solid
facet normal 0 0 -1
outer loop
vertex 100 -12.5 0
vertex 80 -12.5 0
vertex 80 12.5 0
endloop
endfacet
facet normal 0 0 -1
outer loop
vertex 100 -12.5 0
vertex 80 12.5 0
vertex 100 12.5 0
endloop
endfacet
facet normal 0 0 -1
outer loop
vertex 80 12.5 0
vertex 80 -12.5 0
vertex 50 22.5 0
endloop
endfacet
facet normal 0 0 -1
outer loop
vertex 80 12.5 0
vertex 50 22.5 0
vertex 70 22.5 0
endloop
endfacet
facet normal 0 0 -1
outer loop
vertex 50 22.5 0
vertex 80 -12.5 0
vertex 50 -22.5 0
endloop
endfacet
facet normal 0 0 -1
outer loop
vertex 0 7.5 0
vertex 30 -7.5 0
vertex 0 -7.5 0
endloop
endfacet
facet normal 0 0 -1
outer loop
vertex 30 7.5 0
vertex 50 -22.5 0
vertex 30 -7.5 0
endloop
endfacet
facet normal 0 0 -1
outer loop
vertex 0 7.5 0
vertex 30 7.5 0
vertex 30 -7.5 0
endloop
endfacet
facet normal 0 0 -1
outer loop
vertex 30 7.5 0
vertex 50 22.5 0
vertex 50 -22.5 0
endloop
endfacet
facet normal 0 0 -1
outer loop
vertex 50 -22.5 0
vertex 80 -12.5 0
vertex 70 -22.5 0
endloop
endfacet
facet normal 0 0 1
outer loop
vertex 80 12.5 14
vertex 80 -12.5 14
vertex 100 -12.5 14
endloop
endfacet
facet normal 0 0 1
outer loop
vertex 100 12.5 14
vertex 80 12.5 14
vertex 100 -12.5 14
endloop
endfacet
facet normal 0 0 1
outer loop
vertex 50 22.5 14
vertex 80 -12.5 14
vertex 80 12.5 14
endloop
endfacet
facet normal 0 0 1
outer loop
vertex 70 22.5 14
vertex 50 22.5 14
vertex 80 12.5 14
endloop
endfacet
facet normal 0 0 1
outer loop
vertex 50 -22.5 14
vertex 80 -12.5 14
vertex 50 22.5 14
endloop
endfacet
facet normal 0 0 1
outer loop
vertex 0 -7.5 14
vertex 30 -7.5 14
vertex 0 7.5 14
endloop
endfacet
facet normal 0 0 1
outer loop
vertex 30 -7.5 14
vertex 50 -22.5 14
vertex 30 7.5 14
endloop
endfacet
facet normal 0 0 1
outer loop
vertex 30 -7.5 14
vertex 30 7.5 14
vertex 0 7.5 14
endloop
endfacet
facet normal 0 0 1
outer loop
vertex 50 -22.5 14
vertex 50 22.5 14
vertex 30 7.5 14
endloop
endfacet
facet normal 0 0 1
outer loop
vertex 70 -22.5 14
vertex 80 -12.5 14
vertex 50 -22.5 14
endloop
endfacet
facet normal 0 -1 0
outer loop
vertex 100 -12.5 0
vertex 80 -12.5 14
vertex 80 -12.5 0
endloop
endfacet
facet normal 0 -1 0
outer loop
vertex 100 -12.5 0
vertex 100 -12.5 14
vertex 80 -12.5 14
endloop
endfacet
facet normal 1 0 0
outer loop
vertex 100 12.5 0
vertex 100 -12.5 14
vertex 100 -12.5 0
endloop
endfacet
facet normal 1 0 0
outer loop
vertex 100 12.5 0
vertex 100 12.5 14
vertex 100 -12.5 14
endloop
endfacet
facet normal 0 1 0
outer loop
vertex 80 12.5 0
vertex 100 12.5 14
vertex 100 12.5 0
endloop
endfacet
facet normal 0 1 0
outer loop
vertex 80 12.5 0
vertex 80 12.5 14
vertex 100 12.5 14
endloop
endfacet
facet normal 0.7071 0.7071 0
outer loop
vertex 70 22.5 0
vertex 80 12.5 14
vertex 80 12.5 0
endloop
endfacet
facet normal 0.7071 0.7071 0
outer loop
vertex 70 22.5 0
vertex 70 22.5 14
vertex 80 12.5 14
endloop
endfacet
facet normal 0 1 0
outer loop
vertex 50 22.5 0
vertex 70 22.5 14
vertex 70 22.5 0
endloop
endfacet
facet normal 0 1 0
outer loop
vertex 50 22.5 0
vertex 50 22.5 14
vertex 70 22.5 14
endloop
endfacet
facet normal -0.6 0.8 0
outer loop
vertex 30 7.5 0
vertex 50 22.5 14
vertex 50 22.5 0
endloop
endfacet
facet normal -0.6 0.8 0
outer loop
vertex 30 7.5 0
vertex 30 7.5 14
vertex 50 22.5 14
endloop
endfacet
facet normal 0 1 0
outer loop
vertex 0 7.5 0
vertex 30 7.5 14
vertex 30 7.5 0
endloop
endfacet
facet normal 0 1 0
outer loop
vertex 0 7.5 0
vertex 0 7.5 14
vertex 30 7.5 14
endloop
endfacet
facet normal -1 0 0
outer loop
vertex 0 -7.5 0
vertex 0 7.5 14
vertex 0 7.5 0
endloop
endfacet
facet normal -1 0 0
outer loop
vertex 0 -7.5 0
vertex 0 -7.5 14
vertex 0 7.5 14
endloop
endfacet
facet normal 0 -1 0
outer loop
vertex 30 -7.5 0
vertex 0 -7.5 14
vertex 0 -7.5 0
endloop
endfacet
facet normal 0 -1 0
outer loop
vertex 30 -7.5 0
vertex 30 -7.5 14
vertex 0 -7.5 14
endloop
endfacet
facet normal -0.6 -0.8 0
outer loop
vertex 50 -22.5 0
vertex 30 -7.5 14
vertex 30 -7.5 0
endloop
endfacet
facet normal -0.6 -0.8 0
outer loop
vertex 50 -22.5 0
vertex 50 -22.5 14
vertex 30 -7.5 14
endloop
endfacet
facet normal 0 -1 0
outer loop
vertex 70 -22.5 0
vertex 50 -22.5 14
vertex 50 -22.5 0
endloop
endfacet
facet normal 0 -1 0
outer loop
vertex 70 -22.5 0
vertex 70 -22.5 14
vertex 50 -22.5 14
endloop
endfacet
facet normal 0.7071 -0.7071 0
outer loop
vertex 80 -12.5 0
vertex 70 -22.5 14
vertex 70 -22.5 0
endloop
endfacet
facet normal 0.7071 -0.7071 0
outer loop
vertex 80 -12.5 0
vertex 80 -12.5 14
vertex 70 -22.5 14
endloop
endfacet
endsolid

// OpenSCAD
// Racing Car Body

// model parameters
d1=30;
d2=20;
d3=20;
d4=10;
d5=20;

w1=15;
w2=45;
w3=25;

h=14;

// distances to lengths
l1 = d1;
l2 = d1 + d2;
l3 = d1 + d2 + d3;
l4 = d1 + d2 + d3 + d4;
l5 = d1 + d2 + d3 + d4 + d5;

// right side points
p0 = [0, w1/2];
p1 = [l1, w1/2];
p2 = [l2, w2/2];
p3 = [l3, w2/2];
p4 = [l4, w3/2];
p5 = [l5, w3/2];

// left side points
p6 = [l5, -w3/2];
p7 = [l4, -w3/2];
p8 = [l3, -w2/2];
p9 = [l2, -w2/2];
p10 = [l1, -w1/2];
p11 = [0, -w1/2];

// all points
points = [p0, p1, p2, p3, p4, p5, p6, p7, p8, p9, p10, p11];

// extruded body profile
linear_extrude(height=h)
    polygon(points);
